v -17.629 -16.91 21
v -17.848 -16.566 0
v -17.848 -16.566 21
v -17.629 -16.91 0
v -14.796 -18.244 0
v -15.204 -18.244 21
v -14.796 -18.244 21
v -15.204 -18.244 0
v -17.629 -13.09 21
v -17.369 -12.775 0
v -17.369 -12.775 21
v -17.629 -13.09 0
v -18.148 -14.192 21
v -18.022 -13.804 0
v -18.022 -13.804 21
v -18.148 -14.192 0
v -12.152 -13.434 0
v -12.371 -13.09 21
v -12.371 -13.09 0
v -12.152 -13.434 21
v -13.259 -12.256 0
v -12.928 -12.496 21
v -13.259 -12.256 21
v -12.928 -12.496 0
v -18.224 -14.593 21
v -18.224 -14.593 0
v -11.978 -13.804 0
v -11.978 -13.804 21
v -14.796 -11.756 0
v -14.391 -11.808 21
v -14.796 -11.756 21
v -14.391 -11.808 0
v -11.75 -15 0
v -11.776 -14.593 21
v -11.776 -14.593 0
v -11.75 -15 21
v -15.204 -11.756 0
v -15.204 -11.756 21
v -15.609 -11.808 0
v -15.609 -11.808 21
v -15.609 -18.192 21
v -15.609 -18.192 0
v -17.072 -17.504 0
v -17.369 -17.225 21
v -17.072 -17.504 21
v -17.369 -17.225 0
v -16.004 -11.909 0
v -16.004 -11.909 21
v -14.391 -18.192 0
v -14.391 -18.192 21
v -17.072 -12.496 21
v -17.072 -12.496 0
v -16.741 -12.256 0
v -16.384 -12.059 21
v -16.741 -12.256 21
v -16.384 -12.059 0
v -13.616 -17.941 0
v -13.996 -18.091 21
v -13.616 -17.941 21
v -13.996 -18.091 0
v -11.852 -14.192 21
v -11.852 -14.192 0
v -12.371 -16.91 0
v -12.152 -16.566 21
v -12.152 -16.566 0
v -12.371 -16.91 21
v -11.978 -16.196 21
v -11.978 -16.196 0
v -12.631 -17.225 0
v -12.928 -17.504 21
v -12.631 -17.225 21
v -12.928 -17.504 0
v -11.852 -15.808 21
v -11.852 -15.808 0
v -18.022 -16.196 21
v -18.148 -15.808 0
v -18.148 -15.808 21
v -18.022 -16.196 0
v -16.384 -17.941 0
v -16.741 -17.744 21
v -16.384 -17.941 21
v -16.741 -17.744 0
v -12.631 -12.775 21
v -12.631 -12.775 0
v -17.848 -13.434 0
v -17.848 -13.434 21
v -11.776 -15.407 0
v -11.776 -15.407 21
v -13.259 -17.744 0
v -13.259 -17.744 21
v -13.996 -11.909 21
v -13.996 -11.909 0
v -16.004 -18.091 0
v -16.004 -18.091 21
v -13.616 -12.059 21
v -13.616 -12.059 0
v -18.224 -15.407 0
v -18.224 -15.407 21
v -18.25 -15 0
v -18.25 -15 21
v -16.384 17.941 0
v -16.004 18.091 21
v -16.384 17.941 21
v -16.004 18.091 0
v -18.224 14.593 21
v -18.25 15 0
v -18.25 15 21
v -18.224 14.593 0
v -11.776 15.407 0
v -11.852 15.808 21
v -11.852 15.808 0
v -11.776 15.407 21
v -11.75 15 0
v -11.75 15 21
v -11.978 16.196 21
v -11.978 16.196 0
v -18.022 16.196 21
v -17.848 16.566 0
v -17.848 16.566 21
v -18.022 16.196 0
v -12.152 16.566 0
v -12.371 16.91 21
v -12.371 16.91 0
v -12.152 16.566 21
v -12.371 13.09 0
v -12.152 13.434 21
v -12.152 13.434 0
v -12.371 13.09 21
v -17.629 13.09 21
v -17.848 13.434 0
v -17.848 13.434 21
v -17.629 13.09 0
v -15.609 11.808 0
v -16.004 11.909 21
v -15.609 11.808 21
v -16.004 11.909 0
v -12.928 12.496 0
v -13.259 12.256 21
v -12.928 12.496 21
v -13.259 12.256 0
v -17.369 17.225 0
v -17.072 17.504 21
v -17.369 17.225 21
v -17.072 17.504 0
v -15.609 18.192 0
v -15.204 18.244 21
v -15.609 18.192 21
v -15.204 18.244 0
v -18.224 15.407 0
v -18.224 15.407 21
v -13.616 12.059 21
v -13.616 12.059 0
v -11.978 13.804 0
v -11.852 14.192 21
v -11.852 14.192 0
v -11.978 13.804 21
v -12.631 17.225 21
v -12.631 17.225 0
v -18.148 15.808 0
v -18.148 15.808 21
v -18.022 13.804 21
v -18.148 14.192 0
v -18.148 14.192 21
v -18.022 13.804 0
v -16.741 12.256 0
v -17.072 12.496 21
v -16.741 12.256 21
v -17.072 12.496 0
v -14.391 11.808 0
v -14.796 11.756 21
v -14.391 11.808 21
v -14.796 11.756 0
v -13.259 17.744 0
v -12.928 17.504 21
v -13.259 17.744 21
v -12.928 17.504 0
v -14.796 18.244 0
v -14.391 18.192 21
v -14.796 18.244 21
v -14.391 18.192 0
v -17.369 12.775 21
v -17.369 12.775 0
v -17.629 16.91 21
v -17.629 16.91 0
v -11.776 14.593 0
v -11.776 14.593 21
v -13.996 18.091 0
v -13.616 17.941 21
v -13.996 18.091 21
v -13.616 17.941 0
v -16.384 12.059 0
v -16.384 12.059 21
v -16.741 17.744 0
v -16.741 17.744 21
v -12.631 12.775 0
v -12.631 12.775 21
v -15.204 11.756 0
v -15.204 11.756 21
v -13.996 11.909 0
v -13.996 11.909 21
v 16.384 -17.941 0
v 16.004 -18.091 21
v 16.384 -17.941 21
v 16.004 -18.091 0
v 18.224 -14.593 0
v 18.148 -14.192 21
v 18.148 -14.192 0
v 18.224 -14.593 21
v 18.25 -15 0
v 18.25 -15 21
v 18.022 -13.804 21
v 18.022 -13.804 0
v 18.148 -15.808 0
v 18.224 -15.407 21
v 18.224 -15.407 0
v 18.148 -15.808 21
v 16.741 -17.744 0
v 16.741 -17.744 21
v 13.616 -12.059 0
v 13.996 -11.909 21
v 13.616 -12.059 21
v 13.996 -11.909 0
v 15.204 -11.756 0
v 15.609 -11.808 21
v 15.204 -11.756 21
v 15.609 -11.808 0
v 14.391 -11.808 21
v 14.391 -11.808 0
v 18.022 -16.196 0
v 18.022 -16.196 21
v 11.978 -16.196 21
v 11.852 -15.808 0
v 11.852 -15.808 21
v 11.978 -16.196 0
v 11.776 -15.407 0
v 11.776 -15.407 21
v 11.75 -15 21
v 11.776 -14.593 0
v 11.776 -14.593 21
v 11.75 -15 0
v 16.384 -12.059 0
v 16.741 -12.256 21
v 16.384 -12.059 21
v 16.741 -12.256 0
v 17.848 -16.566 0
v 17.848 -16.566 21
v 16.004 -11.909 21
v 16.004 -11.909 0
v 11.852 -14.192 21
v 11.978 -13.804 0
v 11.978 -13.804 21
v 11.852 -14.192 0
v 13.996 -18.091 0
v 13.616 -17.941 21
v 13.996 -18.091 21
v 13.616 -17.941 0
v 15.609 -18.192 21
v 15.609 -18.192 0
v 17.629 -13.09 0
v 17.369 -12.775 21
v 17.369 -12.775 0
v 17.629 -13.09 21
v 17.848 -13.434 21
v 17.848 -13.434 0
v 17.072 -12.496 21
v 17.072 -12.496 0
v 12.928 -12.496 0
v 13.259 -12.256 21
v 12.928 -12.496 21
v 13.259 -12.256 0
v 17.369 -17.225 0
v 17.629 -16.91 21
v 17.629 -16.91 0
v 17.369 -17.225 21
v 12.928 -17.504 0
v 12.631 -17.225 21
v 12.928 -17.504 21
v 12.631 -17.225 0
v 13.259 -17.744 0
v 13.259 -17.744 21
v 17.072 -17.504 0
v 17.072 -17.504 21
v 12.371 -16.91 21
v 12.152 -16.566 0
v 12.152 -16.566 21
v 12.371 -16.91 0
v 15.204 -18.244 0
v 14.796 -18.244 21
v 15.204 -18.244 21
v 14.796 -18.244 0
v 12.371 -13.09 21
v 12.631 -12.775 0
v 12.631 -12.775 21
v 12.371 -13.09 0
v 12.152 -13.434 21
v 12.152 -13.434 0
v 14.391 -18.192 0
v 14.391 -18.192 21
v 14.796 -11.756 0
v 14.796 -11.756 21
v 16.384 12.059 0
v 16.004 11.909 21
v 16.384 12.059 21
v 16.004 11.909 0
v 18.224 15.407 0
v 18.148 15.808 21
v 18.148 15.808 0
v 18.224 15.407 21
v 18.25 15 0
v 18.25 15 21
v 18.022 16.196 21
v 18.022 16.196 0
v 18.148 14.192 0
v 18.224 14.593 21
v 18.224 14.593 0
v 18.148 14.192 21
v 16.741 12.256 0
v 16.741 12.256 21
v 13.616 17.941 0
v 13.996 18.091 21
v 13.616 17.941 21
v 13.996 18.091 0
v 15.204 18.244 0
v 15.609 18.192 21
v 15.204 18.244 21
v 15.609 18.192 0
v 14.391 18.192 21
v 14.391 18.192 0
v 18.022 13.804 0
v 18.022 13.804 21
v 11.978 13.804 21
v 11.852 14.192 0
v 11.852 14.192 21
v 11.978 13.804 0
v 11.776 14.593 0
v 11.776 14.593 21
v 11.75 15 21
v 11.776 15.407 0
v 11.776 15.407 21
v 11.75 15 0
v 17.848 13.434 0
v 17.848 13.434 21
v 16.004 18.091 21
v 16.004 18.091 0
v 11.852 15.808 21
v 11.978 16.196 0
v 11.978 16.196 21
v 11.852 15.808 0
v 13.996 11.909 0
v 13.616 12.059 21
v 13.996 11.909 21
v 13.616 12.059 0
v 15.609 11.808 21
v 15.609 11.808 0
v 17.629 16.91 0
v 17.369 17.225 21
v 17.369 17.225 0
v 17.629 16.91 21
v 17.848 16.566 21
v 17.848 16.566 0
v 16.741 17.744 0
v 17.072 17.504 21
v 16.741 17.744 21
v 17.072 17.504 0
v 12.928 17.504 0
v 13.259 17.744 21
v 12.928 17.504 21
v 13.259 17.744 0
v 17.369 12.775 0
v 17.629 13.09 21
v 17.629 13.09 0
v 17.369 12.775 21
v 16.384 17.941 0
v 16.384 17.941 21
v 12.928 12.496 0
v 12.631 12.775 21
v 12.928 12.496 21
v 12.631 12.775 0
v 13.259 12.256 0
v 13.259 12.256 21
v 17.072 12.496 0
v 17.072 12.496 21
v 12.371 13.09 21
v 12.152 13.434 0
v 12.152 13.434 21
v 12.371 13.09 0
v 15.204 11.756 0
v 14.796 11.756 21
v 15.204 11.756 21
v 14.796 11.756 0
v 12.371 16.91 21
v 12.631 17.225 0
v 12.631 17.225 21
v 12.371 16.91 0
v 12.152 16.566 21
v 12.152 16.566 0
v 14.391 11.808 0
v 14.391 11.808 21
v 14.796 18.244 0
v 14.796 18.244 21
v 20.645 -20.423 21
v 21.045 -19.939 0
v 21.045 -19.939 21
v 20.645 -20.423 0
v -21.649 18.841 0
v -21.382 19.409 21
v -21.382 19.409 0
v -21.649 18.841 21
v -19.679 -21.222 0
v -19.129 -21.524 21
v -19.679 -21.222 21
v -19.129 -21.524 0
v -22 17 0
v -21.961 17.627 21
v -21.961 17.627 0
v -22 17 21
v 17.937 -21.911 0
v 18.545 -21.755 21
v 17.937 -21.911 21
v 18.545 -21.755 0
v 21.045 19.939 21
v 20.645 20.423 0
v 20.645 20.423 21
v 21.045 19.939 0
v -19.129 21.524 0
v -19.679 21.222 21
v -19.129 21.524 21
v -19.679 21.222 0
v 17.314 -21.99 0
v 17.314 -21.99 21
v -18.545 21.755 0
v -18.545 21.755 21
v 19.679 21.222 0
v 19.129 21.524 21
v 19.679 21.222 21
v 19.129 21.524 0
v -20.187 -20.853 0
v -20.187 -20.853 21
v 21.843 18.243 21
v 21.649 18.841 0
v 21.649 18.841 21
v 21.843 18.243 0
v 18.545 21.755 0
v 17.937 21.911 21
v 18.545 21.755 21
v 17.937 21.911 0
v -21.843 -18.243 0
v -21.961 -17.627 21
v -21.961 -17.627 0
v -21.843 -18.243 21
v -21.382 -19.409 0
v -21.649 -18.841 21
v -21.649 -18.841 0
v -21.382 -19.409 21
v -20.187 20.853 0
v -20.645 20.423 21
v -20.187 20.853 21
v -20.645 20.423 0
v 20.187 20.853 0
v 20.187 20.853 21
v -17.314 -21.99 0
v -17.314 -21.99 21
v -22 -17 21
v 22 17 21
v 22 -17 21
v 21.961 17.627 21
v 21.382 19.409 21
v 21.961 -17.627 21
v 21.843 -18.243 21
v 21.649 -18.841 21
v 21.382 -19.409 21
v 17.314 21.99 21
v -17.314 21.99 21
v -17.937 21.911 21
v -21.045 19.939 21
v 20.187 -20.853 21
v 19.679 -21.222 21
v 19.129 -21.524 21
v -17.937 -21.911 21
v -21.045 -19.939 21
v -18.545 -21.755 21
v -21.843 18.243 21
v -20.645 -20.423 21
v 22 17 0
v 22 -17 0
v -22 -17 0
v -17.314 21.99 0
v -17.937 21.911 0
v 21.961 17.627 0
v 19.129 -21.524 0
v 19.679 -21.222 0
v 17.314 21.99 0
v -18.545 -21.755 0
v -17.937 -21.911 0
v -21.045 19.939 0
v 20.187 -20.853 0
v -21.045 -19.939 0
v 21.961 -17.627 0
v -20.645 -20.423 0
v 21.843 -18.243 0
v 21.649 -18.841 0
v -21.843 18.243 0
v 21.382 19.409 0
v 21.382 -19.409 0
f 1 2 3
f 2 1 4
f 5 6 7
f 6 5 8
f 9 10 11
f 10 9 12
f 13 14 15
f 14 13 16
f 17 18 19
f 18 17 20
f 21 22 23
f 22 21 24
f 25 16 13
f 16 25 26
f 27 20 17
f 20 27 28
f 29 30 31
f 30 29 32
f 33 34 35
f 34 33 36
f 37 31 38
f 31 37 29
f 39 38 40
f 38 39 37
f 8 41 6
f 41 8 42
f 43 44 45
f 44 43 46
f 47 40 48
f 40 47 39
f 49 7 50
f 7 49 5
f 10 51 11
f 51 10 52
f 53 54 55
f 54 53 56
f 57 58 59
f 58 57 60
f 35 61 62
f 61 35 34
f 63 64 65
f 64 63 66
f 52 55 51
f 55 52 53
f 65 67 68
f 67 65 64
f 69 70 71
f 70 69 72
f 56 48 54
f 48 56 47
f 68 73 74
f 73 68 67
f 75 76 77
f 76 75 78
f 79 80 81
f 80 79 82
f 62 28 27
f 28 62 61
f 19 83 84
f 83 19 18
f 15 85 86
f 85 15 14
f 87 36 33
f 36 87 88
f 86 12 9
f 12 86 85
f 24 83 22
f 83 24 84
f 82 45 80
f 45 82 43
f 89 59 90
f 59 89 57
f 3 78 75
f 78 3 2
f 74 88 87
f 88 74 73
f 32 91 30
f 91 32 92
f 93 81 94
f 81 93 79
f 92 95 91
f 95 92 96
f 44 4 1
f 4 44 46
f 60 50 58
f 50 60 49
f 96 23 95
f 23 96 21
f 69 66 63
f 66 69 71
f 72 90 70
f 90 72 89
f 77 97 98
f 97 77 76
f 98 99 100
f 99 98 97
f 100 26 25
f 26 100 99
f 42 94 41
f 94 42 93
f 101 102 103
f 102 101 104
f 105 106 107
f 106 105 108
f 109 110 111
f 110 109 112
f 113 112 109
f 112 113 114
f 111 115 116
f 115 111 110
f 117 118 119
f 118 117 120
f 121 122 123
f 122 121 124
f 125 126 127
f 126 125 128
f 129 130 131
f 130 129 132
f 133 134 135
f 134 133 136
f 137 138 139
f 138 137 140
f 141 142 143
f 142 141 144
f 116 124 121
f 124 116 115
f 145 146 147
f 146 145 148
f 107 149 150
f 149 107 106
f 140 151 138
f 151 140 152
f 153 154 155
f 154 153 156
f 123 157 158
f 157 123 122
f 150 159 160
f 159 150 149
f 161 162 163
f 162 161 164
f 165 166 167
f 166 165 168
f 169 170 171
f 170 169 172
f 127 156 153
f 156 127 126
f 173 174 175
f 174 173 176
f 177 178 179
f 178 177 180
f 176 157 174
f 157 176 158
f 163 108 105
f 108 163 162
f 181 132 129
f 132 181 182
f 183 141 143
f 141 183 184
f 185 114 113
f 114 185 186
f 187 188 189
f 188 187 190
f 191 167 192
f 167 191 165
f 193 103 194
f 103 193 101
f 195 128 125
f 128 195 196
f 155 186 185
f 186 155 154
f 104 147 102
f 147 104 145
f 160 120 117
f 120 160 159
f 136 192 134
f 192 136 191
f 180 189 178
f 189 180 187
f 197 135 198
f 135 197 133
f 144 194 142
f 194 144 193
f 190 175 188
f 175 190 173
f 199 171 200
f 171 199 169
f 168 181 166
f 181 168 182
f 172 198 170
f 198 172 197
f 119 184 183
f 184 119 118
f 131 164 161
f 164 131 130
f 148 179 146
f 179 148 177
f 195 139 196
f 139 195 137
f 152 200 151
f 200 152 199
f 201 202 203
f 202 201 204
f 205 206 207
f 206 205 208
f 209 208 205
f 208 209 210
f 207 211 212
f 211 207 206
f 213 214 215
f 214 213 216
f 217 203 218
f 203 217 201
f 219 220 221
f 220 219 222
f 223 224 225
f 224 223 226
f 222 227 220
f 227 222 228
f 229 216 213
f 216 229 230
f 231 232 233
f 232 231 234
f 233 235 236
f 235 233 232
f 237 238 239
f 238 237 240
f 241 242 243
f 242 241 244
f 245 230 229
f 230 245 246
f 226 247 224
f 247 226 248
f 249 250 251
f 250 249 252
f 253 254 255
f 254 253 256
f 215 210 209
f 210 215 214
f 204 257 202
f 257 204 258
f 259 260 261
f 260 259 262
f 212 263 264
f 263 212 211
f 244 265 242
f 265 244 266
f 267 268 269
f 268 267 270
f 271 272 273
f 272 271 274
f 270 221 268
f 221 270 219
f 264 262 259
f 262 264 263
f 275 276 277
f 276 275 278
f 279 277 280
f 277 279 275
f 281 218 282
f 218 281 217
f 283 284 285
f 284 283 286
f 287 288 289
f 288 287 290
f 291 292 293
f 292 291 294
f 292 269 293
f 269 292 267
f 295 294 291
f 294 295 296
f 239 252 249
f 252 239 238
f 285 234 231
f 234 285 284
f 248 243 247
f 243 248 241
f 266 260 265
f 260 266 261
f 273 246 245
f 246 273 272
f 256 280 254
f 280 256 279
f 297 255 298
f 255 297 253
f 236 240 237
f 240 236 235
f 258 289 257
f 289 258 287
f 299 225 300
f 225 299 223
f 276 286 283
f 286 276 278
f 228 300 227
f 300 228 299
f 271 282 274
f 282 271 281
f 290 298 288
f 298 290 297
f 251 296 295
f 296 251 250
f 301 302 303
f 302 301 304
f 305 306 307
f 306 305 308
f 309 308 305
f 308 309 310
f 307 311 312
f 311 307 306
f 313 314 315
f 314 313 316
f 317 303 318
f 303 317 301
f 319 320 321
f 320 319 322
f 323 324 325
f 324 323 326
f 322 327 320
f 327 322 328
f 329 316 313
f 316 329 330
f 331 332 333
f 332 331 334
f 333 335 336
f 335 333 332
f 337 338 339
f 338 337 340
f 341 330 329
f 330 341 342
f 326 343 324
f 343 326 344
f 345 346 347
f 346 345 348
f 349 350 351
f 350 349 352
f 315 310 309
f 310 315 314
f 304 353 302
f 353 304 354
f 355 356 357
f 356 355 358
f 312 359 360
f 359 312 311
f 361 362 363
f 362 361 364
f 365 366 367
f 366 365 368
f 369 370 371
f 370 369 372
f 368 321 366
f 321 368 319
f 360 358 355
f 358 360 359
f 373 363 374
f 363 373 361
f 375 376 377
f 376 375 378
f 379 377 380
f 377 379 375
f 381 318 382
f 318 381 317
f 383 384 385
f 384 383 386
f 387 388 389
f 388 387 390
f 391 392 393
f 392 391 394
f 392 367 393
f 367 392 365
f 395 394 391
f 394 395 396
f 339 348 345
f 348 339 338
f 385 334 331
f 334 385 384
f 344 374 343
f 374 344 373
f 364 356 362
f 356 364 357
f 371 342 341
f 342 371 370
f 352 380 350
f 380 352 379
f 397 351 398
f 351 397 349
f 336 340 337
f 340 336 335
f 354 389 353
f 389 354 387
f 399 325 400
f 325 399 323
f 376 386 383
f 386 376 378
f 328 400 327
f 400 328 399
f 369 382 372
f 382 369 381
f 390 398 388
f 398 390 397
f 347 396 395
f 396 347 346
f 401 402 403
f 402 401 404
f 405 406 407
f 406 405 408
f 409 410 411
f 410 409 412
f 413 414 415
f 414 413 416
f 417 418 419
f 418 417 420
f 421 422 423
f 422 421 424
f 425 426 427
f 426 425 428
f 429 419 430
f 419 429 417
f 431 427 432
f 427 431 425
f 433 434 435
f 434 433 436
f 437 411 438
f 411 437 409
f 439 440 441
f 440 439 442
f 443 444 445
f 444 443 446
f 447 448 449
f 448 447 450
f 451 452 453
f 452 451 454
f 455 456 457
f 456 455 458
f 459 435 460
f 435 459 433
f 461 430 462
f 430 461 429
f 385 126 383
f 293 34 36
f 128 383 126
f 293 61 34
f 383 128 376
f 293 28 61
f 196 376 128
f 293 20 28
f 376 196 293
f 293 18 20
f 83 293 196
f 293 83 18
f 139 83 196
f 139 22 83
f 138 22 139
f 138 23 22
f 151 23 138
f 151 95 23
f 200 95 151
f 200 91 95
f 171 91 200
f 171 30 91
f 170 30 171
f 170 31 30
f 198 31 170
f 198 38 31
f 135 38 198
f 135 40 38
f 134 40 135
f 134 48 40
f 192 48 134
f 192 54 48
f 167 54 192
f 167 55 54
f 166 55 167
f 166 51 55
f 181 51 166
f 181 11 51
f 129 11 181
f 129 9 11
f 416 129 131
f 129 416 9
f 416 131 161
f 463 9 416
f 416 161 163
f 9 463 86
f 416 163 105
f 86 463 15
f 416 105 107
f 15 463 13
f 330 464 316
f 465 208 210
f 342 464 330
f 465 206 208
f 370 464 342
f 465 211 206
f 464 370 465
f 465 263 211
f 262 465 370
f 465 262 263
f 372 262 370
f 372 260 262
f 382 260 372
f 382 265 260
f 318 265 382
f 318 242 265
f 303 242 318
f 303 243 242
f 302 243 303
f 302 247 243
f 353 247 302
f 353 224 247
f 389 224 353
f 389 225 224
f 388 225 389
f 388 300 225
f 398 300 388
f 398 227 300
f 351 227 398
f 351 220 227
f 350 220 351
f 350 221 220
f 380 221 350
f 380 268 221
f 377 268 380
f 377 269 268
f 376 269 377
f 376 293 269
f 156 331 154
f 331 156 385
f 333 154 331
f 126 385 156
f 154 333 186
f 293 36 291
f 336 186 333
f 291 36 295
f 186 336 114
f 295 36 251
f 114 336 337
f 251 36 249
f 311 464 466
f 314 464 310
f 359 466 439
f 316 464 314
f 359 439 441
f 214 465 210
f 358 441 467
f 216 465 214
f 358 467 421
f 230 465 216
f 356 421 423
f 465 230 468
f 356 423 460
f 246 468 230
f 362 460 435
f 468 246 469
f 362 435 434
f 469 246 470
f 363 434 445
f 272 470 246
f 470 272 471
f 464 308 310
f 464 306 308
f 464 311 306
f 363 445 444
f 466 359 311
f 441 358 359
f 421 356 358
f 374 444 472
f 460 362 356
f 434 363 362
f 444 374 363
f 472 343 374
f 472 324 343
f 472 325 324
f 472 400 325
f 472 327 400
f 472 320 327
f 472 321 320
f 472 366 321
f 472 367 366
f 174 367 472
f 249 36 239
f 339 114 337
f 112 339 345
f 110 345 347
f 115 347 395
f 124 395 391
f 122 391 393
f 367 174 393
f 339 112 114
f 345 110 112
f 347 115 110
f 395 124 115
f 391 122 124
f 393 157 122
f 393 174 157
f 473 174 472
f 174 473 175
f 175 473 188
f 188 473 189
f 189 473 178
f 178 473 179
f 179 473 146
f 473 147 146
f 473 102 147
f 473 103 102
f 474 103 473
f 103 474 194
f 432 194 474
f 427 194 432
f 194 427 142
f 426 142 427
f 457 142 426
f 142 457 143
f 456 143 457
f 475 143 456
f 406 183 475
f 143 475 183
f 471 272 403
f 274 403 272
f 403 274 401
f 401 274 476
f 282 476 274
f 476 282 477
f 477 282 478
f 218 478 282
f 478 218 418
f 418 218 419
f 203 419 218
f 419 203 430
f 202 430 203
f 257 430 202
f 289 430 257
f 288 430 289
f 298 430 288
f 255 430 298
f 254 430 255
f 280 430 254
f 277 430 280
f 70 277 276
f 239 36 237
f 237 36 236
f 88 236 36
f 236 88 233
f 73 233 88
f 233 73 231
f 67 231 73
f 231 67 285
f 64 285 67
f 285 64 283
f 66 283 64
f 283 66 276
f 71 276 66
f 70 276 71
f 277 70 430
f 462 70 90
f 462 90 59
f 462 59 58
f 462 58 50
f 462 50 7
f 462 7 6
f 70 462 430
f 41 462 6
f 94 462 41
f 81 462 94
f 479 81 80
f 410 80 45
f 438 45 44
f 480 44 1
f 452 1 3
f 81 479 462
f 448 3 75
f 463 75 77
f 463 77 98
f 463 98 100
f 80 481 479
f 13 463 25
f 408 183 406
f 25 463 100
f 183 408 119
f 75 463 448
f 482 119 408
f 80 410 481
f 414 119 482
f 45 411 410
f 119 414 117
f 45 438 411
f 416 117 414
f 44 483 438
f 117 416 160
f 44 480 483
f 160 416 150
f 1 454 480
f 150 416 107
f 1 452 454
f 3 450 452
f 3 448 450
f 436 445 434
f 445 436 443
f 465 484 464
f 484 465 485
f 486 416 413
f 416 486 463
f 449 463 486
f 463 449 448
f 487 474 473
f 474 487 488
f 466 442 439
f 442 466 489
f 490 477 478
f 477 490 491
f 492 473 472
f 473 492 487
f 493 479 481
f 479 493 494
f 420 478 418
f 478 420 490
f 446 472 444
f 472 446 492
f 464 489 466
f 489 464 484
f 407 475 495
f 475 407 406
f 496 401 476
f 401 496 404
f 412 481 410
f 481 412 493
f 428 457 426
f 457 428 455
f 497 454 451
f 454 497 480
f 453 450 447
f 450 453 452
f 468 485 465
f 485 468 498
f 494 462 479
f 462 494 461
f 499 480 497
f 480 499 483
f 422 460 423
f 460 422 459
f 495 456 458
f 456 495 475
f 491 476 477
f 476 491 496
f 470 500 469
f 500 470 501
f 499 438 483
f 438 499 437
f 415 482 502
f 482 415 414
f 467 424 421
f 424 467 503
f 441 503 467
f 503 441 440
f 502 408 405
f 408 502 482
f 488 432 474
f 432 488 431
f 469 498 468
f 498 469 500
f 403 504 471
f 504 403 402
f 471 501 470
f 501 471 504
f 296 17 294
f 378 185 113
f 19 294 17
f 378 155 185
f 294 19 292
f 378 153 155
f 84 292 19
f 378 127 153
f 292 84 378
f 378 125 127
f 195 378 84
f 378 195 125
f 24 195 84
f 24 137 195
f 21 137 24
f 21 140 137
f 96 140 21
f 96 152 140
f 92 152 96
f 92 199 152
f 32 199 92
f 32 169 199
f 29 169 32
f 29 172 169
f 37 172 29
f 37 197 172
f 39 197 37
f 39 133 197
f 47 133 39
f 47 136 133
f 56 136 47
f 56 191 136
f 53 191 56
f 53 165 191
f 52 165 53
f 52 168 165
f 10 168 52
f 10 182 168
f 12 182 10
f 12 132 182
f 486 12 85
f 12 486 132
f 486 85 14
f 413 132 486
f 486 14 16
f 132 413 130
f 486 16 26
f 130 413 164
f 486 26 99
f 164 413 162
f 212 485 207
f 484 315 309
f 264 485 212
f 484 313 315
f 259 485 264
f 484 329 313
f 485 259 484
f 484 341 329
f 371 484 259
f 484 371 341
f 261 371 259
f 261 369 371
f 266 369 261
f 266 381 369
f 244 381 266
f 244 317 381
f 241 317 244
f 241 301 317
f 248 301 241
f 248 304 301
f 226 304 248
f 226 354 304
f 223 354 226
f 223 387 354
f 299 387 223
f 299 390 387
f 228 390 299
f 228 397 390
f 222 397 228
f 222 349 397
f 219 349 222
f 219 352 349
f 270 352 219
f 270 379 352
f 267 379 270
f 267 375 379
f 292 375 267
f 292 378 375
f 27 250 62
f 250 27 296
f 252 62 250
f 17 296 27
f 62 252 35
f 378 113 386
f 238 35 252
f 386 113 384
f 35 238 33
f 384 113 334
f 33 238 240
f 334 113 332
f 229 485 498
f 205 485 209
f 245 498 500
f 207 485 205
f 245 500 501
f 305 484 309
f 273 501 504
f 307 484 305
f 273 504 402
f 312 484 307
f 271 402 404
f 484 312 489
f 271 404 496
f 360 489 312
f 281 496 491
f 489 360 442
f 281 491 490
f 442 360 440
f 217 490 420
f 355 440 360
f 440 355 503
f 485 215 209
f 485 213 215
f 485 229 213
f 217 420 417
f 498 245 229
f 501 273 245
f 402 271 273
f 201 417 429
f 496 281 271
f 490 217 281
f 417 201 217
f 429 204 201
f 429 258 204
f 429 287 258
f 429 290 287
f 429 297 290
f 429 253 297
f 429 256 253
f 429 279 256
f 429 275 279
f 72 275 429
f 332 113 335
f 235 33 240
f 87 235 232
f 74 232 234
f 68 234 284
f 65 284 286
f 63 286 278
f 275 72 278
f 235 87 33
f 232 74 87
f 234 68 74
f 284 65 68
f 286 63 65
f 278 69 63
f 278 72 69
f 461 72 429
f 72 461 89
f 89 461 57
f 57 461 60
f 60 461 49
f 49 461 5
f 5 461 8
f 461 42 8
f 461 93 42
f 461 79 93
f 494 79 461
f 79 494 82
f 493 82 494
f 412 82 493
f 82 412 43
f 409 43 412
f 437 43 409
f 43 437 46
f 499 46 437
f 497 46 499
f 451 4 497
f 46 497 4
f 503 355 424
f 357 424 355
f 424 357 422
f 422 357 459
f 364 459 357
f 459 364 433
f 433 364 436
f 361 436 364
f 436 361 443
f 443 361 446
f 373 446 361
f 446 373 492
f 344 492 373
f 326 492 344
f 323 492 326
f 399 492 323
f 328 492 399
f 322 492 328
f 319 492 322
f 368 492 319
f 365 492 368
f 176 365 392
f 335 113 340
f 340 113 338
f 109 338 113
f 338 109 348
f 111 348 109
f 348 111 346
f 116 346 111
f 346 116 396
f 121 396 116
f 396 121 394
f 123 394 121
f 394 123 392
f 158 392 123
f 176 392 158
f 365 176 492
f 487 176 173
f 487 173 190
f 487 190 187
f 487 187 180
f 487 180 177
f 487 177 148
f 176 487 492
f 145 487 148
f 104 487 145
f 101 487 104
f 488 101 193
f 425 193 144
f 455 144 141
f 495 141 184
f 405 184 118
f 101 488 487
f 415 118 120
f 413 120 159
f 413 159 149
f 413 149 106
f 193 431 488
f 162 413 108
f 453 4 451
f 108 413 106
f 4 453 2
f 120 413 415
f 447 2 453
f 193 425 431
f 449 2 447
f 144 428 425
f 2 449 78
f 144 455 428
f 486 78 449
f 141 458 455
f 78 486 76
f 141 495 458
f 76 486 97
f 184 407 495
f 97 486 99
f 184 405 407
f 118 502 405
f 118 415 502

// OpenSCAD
$fn = 50;


difference() {
	union() {
		hull() {
			translate(v = [-17.0000000000, 17.0000000000, 0]) {
				cylinder(h = 21, r = 5);
			}
			translate(v = [17.0000000000, 17.0000000000, 0]) {
				cylinder(h = 21, r = 5);
			}
			translate(v = [-17.0000000000, -17.0000000000, 0]) {
				cylinder(h = 21, r = 5);
			}
			translate(v = [17.0000000000, -17.0000000000, 0]) {
				cylinder(h = 21, r = 5);
			}
		}
	}
	union() {
		translate(v = [-15.0000000000, -15.0000000000, -100.0000000000]) {
			cylinder(h = 200, r = 3.2500000000);
		}
		translate(v = [-15.0000000000, 15.0000000000, -100.0000000000]) {
			cylinder(h = 200, r = 3.2500000000);
		}
		translate(v = [15.0000000000, -15.0000000000, -100.0000000000]) {
			cylinder(h = 200, r = 3.2500000000);
		}
		translate(v = [15.0000000000, 15.0000000000, -100.0000000000]) {
			cylinder(h = 200, r = 3.2500000000);
		}
	}
}
